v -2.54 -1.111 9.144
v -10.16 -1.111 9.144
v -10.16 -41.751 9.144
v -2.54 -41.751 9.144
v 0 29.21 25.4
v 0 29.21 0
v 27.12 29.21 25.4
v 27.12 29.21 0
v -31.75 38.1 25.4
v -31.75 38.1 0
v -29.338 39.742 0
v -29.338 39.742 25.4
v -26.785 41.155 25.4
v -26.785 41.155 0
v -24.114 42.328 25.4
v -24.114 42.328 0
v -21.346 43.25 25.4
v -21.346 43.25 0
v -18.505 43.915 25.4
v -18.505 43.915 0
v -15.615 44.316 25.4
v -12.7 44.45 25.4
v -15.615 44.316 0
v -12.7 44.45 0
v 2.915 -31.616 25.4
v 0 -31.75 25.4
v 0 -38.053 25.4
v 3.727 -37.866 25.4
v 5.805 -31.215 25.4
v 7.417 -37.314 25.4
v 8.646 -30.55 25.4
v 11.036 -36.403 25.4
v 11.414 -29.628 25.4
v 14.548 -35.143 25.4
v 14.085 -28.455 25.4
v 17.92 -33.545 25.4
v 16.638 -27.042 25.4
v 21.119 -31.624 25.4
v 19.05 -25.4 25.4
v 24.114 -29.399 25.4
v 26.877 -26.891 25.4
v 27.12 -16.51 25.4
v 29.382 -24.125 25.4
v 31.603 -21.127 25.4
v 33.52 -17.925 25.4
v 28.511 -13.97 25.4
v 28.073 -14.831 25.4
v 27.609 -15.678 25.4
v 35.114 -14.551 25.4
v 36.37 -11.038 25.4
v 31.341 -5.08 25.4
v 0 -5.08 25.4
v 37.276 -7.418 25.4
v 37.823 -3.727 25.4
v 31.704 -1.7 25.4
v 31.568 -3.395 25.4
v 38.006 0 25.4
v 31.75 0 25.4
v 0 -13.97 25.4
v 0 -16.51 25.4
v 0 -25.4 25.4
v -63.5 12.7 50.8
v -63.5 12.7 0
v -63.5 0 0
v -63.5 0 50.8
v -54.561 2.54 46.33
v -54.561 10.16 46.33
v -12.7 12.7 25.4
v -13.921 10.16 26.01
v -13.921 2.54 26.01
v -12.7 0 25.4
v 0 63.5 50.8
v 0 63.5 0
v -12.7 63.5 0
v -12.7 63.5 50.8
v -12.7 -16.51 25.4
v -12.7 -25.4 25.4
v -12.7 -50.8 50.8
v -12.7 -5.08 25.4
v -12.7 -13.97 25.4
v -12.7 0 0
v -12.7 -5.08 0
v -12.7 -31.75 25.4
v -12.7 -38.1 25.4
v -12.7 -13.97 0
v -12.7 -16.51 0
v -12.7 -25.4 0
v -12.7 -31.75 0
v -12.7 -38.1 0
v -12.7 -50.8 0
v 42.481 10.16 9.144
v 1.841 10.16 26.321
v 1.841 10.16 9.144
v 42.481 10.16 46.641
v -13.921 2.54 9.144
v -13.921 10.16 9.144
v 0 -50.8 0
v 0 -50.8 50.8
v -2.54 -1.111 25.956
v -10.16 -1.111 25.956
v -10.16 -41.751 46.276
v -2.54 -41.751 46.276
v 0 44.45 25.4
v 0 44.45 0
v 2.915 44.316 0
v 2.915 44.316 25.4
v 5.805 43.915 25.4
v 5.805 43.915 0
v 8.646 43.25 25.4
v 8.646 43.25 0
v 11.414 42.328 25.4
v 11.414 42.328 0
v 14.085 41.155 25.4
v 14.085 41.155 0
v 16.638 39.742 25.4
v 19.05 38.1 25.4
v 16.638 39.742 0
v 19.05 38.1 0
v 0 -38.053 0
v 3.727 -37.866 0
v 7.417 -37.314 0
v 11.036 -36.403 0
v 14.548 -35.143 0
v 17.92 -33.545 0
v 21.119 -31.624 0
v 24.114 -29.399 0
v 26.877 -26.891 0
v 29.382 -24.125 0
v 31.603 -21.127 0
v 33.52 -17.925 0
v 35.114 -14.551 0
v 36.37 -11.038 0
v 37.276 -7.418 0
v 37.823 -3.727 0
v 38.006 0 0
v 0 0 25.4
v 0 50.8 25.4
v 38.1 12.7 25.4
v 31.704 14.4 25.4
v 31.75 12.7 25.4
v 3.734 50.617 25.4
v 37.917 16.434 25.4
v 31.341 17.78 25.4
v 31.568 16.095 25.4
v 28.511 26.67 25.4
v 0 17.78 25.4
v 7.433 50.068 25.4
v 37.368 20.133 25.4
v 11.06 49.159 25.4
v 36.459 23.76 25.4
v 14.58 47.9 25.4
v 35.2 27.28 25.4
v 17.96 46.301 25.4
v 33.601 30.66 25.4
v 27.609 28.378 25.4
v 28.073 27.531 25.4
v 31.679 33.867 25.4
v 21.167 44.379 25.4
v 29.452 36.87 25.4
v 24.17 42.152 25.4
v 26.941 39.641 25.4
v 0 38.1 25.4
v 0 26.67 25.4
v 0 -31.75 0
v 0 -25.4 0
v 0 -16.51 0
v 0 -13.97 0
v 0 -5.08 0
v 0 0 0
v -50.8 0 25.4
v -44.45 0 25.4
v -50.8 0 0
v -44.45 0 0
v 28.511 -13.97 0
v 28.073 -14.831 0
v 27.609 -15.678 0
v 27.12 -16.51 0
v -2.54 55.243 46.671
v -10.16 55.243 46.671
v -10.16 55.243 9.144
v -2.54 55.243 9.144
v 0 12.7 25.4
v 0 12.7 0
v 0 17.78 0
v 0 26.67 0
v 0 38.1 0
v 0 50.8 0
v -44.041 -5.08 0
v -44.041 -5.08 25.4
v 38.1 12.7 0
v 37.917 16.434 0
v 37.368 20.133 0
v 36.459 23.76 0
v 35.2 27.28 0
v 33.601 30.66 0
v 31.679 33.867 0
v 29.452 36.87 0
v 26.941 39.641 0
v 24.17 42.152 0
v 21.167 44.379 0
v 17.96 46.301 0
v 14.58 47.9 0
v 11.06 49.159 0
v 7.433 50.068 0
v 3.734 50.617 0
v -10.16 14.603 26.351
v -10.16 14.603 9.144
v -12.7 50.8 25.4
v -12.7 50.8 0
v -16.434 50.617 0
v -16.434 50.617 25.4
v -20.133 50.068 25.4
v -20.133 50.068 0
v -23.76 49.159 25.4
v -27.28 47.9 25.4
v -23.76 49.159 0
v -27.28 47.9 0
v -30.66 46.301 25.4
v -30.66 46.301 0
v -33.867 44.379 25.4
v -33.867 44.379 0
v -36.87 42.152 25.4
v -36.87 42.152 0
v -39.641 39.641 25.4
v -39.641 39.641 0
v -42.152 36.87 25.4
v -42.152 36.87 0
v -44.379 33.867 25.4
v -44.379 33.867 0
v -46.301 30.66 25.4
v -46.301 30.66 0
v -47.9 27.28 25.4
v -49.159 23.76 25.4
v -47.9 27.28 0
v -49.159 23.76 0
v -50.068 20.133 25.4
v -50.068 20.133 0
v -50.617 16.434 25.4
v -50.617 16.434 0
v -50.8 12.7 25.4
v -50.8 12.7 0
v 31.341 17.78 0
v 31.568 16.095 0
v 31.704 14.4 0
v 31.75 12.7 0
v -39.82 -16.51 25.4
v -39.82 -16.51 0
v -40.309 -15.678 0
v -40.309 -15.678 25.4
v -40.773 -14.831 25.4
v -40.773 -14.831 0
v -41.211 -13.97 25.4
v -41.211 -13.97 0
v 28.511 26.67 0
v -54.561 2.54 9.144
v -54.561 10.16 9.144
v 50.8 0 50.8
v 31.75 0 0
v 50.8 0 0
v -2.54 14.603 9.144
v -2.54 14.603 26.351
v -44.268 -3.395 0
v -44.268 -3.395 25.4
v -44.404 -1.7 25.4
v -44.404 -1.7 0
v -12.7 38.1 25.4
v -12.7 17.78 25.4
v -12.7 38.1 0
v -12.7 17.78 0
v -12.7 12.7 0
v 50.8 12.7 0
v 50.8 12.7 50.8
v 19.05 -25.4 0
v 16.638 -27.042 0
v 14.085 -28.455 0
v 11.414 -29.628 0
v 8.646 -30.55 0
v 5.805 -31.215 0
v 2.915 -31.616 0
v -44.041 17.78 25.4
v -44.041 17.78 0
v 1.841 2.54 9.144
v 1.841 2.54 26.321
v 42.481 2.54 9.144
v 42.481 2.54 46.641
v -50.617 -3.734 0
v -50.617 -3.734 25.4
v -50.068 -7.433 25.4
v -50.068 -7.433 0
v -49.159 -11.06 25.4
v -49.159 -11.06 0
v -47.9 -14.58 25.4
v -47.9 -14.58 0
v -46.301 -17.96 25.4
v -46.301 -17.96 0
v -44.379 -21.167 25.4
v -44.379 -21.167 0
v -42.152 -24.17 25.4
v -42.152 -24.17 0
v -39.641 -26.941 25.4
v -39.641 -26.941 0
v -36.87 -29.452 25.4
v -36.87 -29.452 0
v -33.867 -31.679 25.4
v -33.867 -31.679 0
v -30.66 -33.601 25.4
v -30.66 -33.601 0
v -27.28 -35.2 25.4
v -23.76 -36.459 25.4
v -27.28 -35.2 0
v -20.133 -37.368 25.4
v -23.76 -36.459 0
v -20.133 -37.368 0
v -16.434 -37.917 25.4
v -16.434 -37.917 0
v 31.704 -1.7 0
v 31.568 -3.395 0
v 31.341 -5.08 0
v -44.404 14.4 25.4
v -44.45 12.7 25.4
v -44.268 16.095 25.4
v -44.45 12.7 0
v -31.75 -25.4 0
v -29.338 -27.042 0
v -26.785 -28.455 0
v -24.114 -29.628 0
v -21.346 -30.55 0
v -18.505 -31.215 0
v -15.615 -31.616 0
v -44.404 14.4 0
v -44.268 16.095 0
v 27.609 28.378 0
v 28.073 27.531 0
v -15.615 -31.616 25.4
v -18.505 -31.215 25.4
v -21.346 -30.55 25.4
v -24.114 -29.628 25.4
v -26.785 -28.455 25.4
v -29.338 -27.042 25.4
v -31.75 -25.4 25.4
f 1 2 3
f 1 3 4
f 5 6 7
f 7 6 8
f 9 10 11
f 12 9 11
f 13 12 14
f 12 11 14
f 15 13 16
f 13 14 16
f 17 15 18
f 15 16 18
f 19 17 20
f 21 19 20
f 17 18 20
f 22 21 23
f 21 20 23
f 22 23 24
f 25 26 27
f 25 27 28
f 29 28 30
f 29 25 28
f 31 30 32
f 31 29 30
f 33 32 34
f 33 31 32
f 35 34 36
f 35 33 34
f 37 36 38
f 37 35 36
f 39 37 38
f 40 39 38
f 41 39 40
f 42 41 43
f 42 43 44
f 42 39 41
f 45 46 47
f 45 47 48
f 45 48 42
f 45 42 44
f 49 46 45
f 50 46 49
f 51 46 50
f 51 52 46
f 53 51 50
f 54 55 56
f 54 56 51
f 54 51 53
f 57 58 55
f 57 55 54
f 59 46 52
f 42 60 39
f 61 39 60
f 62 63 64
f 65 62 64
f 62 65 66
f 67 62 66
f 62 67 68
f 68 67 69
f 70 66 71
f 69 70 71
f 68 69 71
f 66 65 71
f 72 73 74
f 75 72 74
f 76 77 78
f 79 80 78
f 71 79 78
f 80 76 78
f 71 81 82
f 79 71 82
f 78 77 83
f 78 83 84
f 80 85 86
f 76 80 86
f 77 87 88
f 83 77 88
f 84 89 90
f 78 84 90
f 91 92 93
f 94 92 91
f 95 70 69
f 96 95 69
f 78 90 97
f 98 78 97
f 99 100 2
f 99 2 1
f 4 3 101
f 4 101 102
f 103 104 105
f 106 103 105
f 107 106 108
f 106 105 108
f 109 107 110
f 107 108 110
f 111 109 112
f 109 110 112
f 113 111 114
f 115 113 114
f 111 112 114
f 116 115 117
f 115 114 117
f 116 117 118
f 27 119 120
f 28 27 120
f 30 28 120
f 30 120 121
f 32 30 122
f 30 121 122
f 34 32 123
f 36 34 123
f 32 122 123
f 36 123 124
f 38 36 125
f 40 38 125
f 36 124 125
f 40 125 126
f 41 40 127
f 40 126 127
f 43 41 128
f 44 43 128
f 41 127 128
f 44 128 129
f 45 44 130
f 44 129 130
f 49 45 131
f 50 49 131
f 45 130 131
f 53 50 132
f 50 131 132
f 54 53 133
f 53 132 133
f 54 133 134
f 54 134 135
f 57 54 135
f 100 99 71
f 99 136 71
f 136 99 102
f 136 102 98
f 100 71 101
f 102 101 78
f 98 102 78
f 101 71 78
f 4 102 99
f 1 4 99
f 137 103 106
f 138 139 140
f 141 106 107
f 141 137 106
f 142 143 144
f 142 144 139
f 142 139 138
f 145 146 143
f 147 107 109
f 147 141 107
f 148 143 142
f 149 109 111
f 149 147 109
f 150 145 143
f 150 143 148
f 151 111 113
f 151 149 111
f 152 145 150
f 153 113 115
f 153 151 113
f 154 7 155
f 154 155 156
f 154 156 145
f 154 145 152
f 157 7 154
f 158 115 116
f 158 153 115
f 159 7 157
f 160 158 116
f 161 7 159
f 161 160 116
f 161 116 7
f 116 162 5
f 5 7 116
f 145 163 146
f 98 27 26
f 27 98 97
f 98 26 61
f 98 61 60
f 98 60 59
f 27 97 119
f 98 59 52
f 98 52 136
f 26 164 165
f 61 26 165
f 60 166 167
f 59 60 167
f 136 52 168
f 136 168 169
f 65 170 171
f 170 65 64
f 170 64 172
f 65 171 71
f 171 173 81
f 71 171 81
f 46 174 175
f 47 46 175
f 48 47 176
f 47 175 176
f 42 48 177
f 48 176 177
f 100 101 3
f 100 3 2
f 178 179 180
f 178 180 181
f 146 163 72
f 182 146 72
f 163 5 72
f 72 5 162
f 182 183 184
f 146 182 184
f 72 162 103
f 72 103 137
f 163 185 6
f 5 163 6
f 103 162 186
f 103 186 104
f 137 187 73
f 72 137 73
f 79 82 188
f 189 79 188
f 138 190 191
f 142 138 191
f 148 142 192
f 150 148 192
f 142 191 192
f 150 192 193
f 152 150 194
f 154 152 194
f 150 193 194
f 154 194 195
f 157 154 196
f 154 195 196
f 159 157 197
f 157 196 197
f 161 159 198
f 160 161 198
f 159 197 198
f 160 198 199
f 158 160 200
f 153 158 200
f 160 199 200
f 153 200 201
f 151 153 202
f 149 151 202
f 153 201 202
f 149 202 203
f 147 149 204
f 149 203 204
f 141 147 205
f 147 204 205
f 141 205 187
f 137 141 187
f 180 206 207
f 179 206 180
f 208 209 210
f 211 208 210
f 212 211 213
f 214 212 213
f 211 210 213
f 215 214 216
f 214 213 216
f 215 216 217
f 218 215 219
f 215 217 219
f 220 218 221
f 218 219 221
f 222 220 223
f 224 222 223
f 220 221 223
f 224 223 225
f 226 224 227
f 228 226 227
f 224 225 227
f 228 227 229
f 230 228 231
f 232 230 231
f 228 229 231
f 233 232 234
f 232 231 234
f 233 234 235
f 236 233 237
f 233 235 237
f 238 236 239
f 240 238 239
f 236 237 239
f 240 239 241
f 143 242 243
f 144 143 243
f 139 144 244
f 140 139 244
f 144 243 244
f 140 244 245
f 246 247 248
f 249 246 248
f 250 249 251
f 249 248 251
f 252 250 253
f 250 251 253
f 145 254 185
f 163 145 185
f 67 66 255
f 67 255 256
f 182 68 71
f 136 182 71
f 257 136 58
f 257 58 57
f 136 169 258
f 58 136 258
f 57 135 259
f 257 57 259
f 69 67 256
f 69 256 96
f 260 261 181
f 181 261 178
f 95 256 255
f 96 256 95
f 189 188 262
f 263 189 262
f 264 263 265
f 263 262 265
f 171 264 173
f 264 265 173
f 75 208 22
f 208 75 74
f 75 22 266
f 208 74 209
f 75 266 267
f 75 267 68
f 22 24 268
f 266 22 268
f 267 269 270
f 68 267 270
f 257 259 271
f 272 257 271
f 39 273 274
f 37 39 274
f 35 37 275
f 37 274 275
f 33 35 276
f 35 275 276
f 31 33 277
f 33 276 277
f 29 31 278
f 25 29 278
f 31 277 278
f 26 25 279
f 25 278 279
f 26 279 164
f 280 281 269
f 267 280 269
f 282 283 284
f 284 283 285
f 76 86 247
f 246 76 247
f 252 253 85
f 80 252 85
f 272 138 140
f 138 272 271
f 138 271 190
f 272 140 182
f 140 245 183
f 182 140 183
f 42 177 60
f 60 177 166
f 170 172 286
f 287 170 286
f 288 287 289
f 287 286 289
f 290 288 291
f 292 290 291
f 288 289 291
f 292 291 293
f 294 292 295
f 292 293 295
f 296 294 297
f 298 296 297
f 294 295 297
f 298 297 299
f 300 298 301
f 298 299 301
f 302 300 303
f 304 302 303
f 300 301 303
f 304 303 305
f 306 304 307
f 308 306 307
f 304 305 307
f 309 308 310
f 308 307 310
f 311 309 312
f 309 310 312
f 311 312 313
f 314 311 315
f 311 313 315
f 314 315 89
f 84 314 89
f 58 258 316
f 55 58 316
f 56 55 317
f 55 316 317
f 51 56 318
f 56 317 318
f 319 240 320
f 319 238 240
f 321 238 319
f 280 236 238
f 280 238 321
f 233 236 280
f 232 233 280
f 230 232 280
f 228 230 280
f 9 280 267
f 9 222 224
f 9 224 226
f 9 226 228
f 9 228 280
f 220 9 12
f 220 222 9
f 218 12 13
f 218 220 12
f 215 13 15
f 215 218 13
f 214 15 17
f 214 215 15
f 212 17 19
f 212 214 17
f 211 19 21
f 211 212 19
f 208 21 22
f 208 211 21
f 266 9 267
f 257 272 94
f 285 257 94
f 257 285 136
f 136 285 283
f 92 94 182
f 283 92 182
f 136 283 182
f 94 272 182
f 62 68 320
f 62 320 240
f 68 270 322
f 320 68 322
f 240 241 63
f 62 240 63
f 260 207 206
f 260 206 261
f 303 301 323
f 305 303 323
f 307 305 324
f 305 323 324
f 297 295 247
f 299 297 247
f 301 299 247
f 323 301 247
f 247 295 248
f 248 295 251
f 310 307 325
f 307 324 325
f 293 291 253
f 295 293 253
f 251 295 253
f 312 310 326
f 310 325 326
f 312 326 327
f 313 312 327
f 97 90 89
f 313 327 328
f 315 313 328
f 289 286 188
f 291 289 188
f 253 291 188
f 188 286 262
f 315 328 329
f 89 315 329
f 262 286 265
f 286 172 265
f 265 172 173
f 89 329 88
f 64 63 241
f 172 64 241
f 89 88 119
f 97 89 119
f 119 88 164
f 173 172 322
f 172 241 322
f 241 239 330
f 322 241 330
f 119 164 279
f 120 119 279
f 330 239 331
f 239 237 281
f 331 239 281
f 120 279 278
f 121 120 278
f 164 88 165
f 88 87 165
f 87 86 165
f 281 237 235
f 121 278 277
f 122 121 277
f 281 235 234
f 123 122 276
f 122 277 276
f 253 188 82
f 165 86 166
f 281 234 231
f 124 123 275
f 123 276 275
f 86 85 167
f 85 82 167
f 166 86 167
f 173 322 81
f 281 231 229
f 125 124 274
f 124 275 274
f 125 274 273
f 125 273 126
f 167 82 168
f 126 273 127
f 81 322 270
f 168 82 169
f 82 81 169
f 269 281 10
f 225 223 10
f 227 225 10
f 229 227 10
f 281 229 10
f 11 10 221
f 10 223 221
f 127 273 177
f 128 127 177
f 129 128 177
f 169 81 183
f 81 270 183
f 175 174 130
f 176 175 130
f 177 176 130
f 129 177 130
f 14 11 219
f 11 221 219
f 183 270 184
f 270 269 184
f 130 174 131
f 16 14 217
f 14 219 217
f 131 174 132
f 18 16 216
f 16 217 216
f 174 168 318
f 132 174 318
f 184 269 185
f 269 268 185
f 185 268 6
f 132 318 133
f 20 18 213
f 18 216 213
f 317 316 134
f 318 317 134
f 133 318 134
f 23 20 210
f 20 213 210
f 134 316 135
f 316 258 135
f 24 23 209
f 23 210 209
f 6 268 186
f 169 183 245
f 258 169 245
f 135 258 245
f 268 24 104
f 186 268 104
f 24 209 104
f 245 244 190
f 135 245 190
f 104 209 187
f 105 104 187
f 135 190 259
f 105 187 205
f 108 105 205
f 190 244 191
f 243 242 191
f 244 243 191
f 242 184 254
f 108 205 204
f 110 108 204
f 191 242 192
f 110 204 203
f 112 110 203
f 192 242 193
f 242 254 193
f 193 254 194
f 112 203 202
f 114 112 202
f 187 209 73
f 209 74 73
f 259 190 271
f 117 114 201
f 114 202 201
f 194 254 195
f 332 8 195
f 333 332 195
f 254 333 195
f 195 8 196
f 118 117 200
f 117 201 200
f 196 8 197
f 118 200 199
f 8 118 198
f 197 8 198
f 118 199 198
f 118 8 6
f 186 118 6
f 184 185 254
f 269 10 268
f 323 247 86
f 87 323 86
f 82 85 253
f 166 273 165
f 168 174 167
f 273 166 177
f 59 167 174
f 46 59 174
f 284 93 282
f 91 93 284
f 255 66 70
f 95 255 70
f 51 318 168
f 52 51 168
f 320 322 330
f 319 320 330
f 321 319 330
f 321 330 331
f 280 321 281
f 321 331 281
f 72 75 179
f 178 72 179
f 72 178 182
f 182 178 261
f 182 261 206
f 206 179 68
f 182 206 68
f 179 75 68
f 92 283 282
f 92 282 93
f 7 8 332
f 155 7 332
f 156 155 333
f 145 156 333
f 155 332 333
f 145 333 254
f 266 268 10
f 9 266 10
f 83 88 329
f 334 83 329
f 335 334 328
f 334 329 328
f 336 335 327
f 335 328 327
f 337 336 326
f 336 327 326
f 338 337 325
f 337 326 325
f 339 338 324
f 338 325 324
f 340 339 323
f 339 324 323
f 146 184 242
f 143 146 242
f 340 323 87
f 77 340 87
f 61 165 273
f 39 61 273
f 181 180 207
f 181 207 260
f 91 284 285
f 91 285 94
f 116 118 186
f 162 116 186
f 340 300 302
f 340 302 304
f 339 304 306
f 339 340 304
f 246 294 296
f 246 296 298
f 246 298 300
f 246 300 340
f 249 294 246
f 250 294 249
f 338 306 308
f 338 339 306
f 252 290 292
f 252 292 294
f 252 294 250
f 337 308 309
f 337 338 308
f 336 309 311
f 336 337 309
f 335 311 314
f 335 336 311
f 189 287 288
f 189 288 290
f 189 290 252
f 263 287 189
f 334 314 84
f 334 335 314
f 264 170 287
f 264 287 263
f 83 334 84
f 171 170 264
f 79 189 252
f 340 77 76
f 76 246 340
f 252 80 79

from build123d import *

# Parameters (mm, degrees)
F0_W      = 12.7
F0_H      = 12.7
F1_DEPTH  = 50.8
F3_DEPTH  = 25.4
F5_DEPTH  = 25.4
F7_DEPTH  = 12.7
F9_DEPTH  = 25.4
F12_DEPTH = 25.4
F13_W     = 40.64
F13_H     = 7.62
F15_W     = 7.62
F15_H     = 40.64
F11_W     = 7.62
F11_H     = 40.64
F14_W     = 40.64
F14_H     = 7.62
F16_DEPTH = 43.18


# Not quite as in the source:
# - a feature names something its author has since deleted; it is built from what else it names


with BuildPart() as f1:
    # F0 (on Top) → F1 (new body)
    with BuildSketch(Plane.XY):
        Polygon((0, 12.7), (0, 0), (31.75, 0), (38.0062268819, 0), (50.8, 0), (50.8, 12.7), (38.1, 12.7), (31.75, 12.7), align=None)
        Polygon((0, -5.08), (0, 0), (-12.7, 0), (-12.7, -5.08), (-12.7, -13.97), (-12.7, -16.51), (-12.7, -25.4), (-12.7, -31.75), (-12.7, -38.1), (-12.7, -50.8), (0, -50.8), (0, -38.0530845557), (0, -31.75), (0, -25.4), (0, -16.51), (0, -13.97), align=None)
        Polygon((-12.7, 12.7), (0, 12.7), (0, 17.78), (0, 26.67), (0, 29.21), (0, 38.1), (0, 44.45), (0, 50.8), (0, 63.5), (-12.7, 63.5), (-12.7, 50.8), (-12.7, 44.45), (-12.7, 38.1), (-12.7, 26.67), (-12.7, 17.78), align=None)
        Polygon((-44.45, 0), (-12.7, 0), (-12.7, 12.7), (-44.45, 12.7), (-50.8, 12.7), (-63.5, 12.7), (-63.5, 0), (-50.8, 0), align=None)
        with Locations((-6.35, 6.35)):
            Rectangle(F0_W, F0_H)
    extrude(amount=F1_DEPTH)

    # F2 (on face) → F3 (cut)
    with BuildSketch(Plane.XZ):
        Polygon((-63.5, 50.8), (-12.7, 25.4), (-12.7, 50.8), align=None)
    extrude(amount=-F3_DEPTH, mode=Mode.SUBTRACT)

    # F4 (on face) → F5 (cut)
    with BuildSketch(Plane(origin=(-12.7, 0, 0), x_dir=(0, -1, 0), z_dir=(-1, 0, 0))):
        Polygon((0, 50.8), (0, 25.4), (50.8, 50.8), align=None)
    extrude(amount=-F5_DEPTH, mode=Mode.SUBTRACT)

    # F6 (on face) → F7 (cut)
    with BuildSketch(Plane(origin=(-12.7, 0, 0), x_dir=(0, -1, 0), z_dir=(-1, 0, 0))):
        Polygon((-12.7, 25.4), (0, 25.4), (0, 50.8), (-63.5, 50.8), align=None)
    extrude(amount=-F7_DEPTH, mode=Mode.SUBTRACT)

    # F8 (on face) → F9 (cut)
    with BuildSketch(Plane(origin=(0, 12.7, 0), x_dir=(-1, 0, 0), z_dir=(0, 1, 0))):
        Polygon((-50.8, 50.8), (0, 25.4), (0, 50.8), align=None)
    extrude(amount=-F9_DEPTH, mode=Mode.SUBTRACT)

    # F0 (on Top) → F12 (join)
    with BuildSketch(Plane.XY):
        with BuildLine():
            Line((38.0062268819, 0), (31.75, 0))
            ThreePointArc((31.75, 0), (31.6475760941, -2.5482204312), (31.3409652053, -5.08))
            ThreePointArc((31.3409652053, -5.08), (30.2545088643, -9.6294960085), (28.5114292872, -13.97))
            ThreePointArc((28.5114292872, -13.97), (27.8445816489, -15.2558766643), (27.1197787602, -16.51))
            ThreePointArc((27.1197787602, -16.51), (23.5089375066, -21.339924023), (19.05, -25.4))
            ThreePointArc((19.05, -25.4), (10.040231571, -30.1206947131), (0, -31.75))
            Line((0, -31.75), (0, -38.0530845557))
            ThreePointArc((0, -38.0530845557), (26.8772997991, -26.8910325481), (38.0062268819, 0))
        make_face()
        with BuildLine():
            ThreePointArc((31.3409652053, 17.78), (31.6475760941, 15.2482204312), (31.75, 12.7))
            Line((31.75, 12.7), (38.1, 12.7))
            ThreePointArc((38.1, 12.7), (26.9407683632, 39.6407683632), (0, 50.8))
            Line((0, 50.8), (0, 44.45))
            ThreePointArc((0, 44.45), (10.040231571, 42.8206947131), (19.05, 38.1))
            ThreePointArc((19.05, 38.1), (23.5089375066, 34.039924023), (27.1197787602, 29.21))
            ThreePointArc((27.1197787602, 29.21), (27.8445816489, 27.9558766643), (28.5114292872, 26.67))
            ThreePointArc((28.5114292872, 26.67), (30.2545088643, 22.3294960085), (31.3409652053, 17.78))
        make_face()
        with BuildLine():
            Line((-12.7, -13.97), (-12.7, -5.08))
            Line((-12.7, -5.08), (-44.0409652053, -5.08))
            ThreePointArc((-44.0409652053, -5.08), (-44.3475760941, -2.5482204312), (-44.45, 0))
            Line((-44.45, 0), (-50.8, 0))
            ThreePointArc((-50.8, 0), (-39.6407683632, -26.9407683632), (-12.7, -38.1))
            Line((-12.7, -38.1), (-12.7, -31.75))
            ThreePointArc((-12.7, -31.75), (-22.740231571, -30.1206947131), (-31.75, -25.4))
            ThreePointArc((-31.75, -25.4), (-36.2089375066, -21.339924023), (-39.8197787602, -16.51))
            ThreePointArc((-39.8197787602, -16.51), (-40.5445816489, -15.2558766643), (-41.2114292872, -13.97))
            Line((-41.2114292872, -13.97), (-12.7, -13.97))
        make_face()
        with BuildLine():
            Line((-50.8, 12.7), (-44.45, 12.7))
            ThreePointArc((-44.45, 12.7), (-44.3475760941, 15.2482204312), (-44.0409652053, 17.78))
            ThreePointArc((-44.0409652053, 17.78), (-42.9545088643, 22.3294960085), (-41.2114292872, 26.67))
            ThreePointArc((-41.2114292872, 26.67), (-37.1577924997, 32.9454658143), (-31.75, 38.1))
            ThreePointArc((-31.75, 38.1), (-22.740231571, 42.8206947131), (-12.7, 44.45))
            Line((-12.7, 44.45), (-12.7, 50.8))
            ThreePointArc((-12.7, 50.8), (-39.6407683632, 39.6407683632), (-50.8, 12.7))
        make_face()
        with BuildLine():
            Line((-12.7, -25.4), (-12.7, -16.51))
            Line((-12.7, -16.51), (-39.8197787602, -16.51))
            ThreePointArc((-39.8197787602, -16.51), (-36.2089375066, -21.339924023), (-31.75, -25.4))
            Line((-31.75, -25.4), (-12.7, -25.4))
        make_face()
        with BuildLine():
            Line((0, 38.1), (0, 29.21))
            Line((0, 29.21), (27.1197787602, 29.21))
            ThreePointArc((27.1197787602, 29.21), (23.5089375066, 34.039924023), (19.05, 38.1))
            Line((19.05, 38.1), (0, 38.1))
        make_face()
        with BuildLine():
            Line((0, 26.67), (0, 17.78))
            Line((0, 17.78), (31.3409652053, 17.78))
            ThreePointArc((31.3409652053, 17.78), (30.2545088643, 22.3294960085), (28.5114292872, 26.67))
            Line((28.5114292872, 26.67), (0, 26.67))
        make_face()
        with BuildLine():
            Line((-41.2114292872, 26.67), (-12.7, 26.67))
            Line((-12.7, 26.67), (-12.7, 38.1))
            Line((-12.7, 38.1), (-31.75, 38.1))
            ThreePointArc((-31.75, 38.1), (-37.1577924997, 32.9454658143), (-41.2114292872, 26.67))
        make_face()
        with BuildLine():
            Line((-44.0409652053, 17.78), (-12.7, 17.78))
            Line((-12.7, 17.78), (-12.7, 26.67))
            Line((-12.7, 26.67), (-41.2114292872, 26.67))
            ThreePointArc((-41.2114292872, 26.67), (-42.9545088643, 22.3294960085), (-44.0409652053, 17.78))
        make_face()
        with BuildLine():
            Line((31.3409652053, -5.08), (0, -5.08))
            Line((0, -5.08), (0, -13.97))
            Line((0, -13.97), (28.5114292872, -13.97))
            ThreePointArc((28.5114292872, -13.97), (30.2545088643, -9.6294960085), (31.3409652053, -5.08))
        make_face()
        with BuildLine():
            Line((27.1197787602, -16.51), (0, -16.51))
            Line((0, -16.51), (0, -25.4))
            Line((0, -25.4), (19.05, -25.4))
            ThreePointArc((19.05, -25.4), (23.5089375066, -21.339924023), (27.1197787602, -16.51))
        make_face()
    extrude(amount=F12_DEPTH)

    # F13 (on offset) + F15 (on offset) + F11 (on offset) + F14 (on offset) → F16 (cut)
    with BuildSketch(Plane.XY.offset(52.324)):
        with Locations((22.1610166958, 6.35)):
            Rectangle(F13_W, F13_H)
    with BuildSketch(Plane.XY.offset(52.324)):
        with Locations((-6.35, -21.4313176799)):
            Rectangle(F15_W, F15_H)
    with BuildSketch(Plane.XY.offset(52.324)):
        with Locations((-6.35, 34.922975541)):
            Rectangle(F11_W, F11_H)
    with BuildSketch(Plane.XY.offset(52.324)):
        with Locations((-34.2408475804, 6.35)):
            Rectangle(F14_W, F14_H)
    extrude(amount=-F16_DEPTH, mode=Mode.SUBTRACT)


solid = f1.part
